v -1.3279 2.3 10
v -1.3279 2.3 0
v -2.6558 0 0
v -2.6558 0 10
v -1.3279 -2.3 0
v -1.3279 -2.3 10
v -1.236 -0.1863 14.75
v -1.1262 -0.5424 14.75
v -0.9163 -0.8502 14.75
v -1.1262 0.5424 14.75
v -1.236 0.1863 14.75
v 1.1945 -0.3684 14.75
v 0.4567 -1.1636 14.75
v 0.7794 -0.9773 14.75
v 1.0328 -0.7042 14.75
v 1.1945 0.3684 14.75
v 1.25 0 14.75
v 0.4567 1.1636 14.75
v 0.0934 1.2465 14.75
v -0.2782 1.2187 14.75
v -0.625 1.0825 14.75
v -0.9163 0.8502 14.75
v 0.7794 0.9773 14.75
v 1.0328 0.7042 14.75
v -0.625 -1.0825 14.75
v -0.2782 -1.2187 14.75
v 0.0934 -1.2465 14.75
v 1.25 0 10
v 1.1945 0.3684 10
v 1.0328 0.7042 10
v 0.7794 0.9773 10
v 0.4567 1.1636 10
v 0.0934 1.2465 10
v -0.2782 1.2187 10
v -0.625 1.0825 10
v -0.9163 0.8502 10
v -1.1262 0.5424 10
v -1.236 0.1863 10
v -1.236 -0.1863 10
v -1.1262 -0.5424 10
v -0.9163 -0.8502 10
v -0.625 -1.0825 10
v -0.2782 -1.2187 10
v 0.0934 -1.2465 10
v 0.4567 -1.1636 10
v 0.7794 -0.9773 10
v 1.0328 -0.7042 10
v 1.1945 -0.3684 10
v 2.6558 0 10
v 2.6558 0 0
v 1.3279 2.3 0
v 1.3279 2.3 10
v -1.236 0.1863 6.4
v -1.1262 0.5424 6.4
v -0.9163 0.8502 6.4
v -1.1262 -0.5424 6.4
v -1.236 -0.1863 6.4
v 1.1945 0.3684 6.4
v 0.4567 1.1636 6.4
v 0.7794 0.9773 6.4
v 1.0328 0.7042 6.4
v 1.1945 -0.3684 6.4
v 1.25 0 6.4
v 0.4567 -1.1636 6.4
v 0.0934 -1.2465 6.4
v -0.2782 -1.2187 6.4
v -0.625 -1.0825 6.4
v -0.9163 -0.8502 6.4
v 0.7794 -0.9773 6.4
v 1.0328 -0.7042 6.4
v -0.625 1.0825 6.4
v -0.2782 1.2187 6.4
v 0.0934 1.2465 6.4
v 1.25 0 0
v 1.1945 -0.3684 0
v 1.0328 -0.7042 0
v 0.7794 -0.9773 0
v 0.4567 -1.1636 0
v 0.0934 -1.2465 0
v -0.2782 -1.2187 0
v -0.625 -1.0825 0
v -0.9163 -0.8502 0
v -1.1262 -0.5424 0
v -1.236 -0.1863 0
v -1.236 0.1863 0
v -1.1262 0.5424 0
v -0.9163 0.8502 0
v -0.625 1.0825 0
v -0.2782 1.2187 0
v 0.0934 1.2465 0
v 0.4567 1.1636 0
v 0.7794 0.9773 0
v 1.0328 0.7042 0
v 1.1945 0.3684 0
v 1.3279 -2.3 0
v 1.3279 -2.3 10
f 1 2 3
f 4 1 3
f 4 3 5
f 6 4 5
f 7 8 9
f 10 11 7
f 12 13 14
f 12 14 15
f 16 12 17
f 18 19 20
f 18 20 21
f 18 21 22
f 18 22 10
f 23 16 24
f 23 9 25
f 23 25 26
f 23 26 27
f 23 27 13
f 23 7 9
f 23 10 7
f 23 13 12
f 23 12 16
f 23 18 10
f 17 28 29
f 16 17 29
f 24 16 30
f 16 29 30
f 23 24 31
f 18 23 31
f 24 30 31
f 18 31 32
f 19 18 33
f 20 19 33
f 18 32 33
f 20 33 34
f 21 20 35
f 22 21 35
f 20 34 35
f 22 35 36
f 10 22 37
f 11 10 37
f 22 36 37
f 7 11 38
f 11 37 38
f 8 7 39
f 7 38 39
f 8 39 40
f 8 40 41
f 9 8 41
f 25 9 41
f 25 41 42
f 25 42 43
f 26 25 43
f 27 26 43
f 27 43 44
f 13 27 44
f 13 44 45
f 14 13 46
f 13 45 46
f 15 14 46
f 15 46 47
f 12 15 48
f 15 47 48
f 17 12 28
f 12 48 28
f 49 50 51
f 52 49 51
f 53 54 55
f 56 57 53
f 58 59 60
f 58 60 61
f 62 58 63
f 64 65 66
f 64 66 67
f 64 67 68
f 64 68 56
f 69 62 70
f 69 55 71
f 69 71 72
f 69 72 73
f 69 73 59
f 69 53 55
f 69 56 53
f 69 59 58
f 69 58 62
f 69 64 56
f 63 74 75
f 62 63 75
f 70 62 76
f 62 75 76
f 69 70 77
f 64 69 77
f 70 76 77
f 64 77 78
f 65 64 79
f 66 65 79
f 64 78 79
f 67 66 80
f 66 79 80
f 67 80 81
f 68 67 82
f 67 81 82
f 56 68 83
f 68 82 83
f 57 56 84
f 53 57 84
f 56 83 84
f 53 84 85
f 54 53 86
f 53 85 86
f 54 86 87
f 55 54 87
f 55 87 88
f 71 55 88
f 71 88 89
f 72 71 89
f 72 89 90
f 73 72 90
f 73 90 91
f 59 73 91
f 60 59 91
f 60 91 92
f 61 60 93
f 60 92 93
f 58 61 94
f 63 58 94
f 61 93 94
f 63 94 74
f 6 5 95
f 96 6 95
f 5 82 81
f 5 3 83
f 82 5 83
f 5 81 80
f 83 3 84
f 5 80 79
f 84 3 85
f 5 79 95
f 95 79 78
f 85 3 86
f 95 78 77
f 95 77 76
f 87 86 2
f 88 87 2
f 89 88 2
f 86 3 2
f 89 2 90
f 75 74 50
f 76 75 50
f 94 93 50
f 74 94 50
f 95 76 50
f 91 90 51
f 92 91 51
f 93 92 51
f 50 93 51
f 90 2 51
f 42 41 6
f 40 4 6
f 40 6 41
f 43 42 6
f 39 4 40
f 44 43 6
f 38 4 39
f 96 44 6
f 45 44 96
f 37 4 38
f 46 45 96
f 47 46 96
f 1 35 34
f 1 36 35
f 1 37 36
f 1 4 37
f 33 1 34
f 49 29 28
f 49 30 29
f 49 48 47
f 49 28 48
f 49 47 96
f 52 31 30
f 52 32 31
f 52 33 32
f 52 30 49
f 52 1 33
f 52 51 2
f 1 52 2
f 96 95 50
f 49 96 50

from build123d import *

# Parameters (mm, degrees)
BODY_DEPTH                      = 10
SKIZZE2_R                       = 1.25
THREAD_DEPTH                    = 4.75
SKIZZE3_R                       = 1.25
SCHNITT_LINEAR_AUSTRAGEN1_DEPTH = 6.4


with BuildPart() as part:
    # Skizze1 → Body (new body)
    with BuildSketch(Plane.XY):
        Polygon((2.655811238, 0), (1.327905619, 2.3), (-1.327905619, 2.3), (-2.655811238, 0), (-1.327905619, -2.3), (1.327905619, -2.3), align=None)
    extrude(amount=BODY_DEPTH)

    # Skizze2 → Thread (add)
    with BuildSketch(Plane.XY.offset(10)):
        Circle(SKIZZE2_R)
    extrude(amount=THREAD_DEPTH)

    # Skizze3 → Schnitt-Linear austragen1 (cut)
    with BuildSketch(Plane(origin=(0, 0, 0), x_dir=(-1, 0, 0), z_dir=(0, 0, -1))):
        with Locations(Location((0, 0, 0), (0, 0, 180))):
            Circle(SKIZZE3_R)
    extrude(amount=-SCHNITT_LINEAR_AUSTRAGEN1_DEPTH, mode=Mode.SUBTRACT)


solid = part.part
